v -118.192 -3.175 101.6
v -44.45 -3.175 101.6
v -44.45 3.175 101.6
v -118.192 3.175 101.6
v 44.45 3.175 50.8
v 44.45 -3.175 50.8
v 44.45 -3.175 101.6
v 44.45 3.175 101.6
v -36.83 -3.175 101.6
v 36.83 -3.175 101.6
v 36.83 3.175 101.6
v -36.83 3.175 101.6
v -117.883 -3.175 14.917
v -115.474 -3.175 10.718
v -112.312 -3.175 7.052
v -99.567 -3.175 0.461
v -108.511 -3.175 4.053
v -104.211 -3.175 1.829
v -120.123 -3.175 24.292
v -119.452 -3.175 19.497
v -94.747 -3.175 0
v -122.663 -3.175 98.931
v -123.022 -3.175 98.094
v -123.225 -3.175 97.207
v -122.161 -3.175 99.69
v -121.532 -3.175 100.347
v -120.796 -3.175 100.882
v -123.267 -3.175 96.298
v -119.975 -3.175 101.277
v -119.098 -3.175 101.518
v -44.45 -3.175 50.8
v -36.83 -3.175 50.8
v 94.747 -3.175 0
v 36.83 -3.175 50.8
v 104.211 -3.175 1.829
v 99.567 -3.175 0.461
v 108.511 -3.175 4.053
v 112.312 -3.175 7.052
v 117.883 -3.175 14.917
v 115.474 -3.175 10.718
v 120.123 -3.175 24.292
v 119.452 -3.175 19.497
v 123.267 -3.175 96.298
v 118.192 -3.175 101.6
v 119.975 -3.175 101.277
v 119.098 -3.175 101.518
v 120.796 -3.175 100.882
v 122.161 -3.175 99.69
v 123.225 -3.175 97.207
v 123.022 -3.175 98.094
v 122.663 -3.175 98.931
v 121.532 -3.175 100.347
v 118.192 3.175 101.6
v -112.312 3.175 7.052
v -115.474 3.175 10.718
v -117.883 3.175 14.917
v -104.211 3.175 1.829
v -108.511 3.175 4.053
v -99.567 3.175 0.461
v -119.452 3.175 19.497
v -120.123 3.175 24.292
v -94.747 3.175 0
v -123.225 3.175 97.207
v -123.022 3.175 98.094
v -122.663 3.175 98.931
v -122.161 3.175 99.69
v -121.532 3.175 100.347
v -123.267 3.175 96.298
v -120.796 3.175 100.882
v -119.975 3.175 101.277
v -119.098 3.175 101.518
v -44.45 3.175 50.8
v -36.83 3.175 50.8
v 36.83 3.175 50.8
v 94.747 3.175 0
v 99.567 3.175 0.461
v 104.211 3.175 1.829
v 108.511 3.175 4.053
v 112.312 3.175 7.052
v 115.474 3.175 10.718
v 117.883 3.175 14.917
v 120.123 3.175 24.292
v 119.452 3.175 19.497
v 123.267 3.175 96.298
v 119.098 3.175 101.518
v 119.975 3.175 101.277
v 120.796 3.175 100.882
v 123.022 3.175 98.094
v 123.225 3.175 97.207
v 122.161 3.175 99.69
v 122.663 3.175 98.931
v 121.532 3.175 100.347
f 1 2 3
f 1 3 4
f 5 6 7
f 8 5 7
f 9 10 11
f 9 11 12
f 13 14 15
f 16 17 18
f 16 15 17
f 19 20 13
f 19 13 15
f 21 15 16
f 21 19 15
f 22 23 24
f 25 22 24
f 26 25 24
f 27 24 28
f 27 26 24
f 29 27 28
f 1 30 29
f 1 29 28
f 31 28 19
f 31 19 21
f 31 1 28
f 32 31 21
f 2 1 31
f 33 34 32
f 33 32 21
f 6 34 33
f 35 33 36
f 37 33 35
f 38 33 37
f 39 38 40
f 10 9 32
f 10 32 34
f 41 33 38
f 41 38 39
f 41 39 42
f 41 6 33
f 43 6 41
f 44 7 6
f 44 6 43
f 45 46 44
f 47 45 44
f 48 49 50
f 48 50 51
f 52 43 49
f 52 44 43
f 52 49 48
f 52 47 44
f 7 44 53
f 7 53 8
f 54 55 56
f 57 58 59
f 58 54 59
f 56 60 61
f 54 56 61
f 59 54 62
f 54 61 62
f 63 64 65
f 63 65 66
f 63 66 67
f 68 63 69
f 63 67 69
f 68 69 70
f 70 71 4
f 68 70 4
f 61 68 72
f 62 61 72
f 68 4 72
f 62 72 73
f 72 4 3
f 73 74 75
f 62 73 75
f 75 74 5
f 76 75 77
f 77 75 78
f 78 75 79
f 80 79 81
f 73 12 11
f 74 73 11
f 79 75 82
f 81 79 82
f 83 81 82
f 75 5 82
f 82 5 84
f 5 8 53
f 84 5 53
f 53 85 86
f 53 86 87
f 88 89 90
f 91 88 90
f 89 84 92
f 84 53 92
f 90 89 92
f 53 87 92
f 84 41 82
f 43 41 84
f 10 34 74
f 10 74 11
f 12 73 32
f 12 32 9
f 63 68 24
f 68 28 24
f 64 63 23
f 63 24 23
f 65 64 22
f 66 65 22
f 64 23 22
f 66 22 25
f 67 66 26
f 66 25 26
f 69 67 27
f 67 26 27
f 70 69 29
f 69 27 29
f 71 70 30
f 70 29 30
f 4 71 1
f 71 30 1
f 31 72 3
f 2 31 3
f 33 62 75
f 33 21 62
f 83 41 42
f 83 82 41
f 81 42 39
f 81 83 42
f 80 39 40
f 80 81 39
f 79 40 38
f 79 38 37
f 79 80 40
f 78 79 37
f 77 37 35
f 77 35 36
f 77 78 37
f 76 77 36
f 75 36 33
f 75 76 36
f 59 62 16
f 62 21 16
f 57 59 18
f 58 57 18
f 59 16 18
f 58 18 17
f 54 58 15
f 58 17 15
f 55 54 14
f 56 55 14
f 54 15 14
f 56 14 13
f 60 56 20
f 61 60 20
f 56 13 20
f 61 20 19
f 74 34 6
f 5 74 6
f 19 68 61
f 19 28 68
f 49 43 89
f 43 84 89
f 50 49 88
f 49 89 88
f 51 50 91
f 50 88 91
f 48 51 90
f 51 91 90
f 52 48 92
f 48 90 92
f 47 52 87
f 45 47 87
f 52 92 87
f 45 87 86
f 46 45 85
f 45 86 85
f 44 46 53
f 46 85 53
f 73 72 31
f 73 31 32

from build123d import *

# Parameters (mm, degrees)
F1_DEPTH = 3.175
F2_W     = 7.62
F2_H     = 50.8
F3_DEPTH = 12.7
F4_R     = 25.4
F5_R     = 5.08


with BuildPart() as f1:
    # F0 (on Front) → F1 (new body, symmetric)
    with BuildSketch(Plane.XZ):
        Polygon((123.498452, 101.6), (-123.498452, 101.6), (-119.0625, 0), (119.0625, 0), align=None)
    extrude(amount=F1_DEPTH, both=True)

    # F2 (on Front) → F3 (cut, symmetric)
    with BuildSketch(Plane.XZ):
        with Locations((-40.64, 76.2)):
            Rectangle(F2_W, F2_H)
        with Locations((40.64, 76.2)):
            Rectangle(F2_W, F2_H)
    extrude(amount=F3_DEPTH, both=True, mode=Mode.SUBTRACT)

    # F4
    f4_edges = [f1.edges().sort_by_distance(p)[0] for p in [
        (-119.0625, 0, 0),
        (119.0625, 0, 0),
    ]]
    fillet(f4_edges, radius=F4_R)

    # F5
    f5_edges = [f1.edges().sort_by_distance(p)[0] for p in [
        (-123.498452, 0, 101.6),
        (123.498452, 0, 101.6),
    ]]
    fillet(f5_edges, radius=F5_R)


solid = f1.part
